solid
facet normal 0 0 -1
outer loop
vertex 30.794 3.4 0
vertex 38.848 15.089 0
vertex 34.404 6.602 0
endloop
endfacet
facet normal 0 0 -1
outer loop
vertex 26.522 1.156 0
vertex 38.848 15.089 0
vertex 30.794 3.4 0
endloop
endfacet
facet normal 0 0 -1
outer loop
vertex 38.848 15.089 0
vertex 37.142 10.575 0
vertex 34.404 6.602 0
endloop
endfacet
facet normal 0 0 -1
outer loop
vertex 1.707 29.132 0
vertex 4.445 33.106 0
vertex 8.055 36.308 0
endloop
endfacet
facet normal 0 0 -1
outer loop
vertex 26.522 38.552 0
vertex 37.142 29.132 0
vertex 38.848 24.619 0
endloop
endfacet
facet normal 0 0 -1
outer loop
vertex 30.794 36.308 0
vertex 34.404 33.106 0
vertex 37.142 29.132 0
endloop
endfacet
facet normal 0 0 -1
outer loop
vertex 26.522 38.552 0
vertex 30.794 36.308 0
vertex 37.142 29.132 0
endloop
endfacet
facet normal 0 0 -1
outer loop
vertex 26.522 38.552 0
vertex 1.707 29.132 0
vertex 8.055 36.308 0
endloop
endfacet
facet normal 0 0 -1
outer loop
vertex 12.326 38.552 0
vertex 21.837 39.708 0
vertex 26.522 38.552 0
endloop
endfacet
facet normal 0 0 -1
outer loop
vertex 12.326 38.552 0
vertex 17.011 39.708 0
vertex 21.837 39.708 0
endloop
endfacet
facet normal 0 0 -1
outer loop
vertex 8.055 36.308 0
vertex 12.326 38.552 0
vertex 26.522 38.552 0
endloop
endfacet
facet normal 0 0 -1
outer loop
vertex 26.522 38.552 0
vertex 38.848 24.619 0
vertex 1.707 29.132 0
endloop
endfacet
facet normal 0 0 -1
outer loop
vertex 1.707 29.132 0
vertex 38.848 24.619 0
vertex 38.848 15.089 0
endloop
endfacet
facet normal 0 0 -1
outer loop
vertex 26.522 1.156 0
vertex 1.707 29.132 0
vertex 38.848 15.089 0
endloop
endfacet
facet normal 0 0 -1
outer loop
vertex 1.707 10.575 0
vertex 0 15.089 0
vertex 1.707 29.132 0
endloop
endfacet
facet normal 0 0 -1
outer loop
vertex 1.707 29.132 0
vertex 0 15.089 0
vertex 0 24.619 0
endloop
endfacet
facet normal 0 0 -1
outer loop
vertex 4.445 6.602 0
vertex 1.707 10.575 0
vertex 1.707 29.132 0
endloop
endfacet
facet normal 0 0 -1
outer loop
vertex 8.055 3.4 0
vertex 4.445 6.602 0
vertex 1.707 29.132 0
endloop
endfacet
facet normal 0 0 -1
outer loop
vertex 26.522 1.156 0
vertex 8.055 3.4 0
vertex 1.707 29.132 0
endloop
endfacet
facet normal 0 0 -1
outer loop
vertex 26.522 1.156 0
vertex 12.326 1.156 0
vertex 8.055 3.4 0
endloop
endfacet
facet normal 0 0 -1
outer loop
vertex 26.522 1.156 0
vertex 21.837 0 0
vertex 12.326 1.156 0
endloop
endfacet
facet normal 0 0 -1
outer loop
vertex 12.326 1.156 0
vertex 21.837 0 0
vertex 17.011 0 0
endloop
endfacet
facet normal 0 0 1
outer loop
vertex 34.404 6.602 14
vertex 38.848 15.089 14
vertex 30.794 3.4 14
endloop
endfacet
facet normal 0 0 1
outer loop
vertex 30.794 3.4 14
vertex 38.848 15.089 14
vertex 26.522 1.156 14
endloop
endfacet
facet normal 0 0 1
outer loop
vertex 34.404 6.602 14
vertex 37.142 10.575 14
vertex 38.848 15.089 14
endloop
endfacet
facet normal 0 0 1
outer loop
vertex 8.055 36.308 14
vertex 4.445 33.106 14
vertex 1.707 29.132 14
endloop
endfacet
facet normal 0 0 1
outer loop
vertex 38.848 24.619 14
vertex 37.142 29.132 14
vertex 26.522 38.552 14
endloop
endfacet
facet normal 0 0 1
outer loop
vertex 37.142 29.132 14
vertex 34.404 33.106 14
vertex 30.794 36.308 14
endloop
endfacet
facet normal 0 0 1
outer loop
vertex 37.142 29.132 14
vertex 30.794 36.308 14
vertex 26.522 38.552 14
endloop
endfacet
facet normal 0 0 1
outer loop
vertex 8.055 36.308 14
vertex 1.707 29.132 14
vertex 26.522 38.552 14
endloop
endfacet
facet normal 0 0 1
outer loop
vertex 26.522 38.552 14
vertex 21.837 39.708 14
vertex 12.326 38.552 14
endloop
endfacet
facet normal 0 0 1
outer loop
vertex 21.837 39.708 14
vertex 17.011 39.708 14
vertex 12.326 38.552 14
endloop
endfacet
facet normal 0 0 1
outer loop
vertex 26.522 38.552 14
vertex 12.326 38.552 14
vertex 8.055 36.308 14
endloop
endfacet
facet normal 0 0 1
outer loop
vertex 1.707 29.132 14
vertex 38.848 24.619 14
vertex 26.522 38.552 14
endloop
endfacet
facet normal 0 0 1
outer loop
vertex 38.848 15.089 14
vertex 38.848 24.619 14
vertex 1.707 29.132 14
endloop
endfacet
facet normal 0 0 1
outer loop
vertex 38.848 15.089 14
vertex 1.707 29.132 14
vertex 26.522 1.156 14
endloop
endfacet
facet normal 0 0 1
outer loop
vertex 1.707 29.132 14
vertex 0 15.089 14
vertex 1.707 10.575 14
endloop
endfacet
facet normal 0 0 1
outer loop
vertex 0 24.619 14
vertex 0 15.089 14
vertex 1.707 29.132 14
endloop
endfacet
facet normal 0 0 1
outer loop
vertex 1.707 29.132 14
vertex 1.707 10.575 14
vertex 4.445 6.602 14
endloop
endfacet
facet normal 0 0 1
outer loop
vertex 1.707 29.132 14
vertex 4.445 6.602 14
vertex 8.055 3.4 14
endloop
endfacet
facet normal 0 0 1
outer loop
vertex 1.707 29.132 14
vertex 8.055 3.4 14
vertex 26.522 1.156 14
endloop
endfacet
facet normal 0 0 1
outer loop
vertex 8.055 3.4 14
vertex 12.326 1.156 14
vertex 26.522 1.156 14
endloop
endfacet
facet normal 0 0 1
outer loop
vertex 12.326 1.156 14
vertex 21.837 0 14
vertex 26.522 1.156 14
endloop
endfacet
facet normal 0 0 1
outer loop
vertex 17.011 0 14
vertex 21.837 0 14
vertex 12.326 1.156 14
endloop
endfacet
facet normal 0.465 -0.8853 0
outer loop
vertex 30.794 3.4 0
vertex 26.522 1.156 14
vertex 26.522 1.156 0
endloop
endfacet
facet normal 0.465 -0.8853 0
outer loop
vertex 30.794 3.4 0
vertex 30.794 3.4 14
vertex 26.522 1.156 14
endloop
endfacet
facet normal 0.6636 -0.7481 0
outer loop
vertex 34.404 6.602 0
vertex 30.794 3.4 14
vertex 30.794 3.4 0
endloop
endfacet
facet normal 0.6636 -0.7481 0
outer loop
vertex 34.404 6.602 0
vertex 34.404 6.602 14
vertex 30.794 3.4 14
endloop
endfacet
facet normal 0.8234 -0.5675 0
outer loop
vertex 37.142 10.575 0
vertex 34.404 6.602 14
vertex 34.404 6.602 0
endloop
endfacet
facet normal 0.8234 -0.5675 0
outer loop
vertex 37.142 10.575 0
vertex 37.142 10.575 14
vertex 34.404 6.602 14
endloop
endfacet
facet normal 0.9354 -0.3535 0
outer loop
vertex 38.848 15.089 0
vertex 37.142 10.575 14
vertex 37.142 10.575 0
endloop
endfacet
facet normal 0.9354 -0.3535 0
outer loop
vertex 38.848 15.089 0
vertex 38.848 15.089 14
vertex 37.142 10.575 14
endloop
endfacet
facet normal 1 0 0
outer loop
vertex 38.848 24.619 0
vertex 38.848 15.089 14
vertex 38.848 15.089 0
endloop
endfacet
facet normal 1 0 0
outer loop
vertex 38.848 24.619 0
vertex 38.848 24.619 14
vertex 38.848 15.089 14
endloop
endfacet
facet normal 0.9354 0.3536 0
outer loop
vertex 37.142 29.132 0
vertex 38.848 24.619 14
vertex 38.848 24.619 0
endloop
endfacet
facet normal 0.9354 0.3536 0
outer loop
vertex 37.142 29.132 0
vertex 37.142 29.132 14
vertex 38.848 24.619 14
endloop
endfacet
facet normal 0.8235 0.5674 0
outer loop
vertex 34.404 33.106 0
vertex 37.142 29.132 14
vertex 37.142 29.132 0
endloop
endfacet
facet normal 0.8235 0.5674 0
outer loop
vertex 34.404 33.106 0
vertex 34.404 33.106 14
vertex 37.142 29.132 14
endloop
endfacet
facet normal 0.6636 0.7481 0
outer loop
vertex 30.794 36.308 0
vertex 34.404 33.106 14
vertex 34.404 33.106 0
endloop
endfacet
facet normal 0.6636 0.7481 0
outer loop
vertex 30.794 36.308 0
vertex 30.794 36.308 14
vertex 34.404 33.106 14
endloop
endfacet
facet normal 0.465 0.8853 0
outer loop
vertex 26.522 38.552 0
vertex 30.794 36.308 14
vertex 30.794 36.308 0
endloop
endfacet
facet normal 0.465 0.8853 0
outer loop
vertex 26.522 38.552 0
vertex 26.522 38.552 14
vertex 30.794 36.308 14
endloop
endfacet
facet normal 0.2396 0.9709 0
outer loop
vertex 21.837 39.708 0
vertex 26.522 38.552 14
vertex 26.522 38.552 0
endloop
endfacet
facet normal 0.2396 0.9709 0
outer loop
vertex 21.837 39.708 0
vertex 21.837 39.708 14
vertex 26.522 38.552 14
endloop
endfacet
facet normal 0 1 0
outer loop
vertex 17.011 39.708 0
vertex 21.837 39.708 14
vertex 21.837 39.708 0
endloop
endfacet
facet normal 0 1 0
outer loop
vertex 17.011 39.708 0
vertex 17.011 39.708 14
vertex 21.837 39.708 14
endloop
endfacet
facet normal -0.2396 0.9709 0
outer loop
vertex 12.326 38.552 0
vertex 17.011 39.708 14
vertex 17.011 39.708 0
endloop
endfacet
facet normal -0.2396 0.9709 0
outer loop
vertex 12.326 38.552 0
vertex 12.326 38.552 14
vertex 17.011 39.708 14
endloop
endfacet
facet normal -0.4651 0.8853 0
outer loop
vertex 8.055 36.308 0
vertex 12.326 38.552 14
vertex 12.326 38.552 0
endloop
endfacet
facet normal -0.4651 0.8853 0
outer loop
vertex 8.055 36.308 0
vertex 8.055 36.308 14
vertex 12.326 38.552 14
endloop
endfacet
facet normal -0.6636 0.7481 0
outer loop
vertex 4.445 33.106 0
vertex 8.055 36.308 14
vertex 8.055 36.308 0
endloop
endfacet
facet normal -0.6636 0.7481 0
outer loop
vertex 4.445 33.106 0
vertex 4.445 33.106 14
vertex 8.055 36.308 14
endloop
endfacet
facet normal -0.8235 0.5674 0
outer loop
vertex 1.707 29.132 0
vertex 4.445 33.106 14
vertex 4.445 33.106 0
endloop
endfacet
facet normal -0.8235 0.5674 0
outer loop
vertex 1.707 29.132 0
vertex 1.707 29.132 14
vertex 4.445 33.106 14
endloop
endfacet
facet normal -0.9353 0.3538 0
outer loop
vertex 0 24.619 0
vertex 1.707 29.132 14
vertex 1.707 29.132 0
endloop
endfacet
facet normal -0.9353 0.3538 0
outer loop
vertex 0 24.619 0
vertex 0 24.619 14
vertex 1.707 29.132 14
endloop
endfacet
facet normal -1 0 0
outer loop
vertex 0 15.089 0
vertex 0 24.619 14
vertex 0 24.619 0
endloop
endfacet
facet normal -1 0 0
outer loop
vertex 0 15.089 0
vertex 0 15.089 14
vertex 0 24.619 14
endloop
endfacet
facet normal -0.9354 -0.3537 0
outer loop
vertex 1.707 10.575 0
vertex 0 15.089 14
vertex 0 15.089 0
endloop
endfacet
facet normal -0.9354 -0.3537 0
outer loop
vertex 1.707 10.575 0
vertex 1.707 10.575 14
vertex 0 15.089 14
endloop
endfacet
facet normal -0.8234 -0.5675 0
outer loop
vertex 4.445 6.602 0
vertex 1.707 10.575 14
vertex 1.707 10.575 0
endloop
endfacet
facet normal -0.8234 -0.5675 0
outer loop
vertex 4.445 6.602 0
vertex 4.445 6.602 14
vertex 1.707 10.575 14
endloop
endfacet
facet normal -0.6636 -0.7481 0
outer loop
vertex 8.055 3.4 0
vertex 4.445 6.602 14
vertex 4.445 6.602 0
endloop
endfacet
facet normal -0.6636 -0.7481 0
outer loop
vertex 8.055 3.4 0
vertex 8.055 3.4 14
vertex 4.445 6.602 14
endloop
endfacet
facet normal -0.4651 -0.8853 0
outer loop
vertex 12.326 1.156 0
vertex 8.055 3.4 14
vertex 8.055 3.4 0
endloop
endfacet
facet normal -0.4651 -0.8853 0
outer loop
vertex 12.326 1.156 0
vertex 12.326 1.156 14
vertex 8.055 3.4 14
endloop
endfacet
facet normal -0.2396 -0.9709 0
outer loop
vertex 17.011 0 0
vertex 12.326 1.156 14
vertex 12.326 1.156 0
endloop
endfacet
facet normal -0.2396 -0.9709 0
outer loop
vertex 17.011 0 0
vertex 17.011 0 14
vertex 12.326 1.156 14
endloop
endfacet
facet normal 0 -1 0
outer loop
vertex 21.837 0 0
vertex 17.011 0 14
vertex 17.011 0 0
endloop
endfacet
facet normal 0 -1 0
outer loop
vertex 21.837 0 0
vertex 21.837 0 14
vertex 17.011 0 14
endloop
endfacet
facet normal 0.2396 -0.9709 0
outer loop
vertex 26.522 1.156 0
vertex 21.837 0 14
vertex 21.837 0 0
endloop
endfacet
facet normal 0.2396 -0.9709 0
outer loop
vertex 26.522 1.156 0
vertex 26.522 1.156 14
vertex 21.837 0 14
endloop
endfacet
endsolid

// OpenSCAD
$fn = 32;

// ----------------------------------------------------------------------
// Flat adaptor: double_d, 14 mm thick
// ----------------------------------------------------------------------

// --- parameters (mm) ---
profile_height = 14;      // extrusion height
profile_points = 24;      // points of the closed outline

profile = [[38.848, 24.619], [37.142, 29.132], [34.404, 33.106], [30.794, 36.308], [26.522, 38.552], [21.837, 39.708], [17.011, 39.708], [12.326, 38.552], [8.055, 36.308], [4.445, 33.106], [1.707, 29.132], [0, 24.619], [0, 15.089], [1.707, 10.575], [4.445, 6.602], [8.055, 3.4], [12.326, 1.156], [17.011, 0], [21.837, 0], [26.522, 1.156], [30.794, 3.4], [34.404, 6.602], [37.142, 10.575], [38.848, 15.089]];  // single closed polygon, 24 points, counter clockwise

// --- the one profile operation ---
linear_extrude(height = profile_height) polygon(points = profile);
